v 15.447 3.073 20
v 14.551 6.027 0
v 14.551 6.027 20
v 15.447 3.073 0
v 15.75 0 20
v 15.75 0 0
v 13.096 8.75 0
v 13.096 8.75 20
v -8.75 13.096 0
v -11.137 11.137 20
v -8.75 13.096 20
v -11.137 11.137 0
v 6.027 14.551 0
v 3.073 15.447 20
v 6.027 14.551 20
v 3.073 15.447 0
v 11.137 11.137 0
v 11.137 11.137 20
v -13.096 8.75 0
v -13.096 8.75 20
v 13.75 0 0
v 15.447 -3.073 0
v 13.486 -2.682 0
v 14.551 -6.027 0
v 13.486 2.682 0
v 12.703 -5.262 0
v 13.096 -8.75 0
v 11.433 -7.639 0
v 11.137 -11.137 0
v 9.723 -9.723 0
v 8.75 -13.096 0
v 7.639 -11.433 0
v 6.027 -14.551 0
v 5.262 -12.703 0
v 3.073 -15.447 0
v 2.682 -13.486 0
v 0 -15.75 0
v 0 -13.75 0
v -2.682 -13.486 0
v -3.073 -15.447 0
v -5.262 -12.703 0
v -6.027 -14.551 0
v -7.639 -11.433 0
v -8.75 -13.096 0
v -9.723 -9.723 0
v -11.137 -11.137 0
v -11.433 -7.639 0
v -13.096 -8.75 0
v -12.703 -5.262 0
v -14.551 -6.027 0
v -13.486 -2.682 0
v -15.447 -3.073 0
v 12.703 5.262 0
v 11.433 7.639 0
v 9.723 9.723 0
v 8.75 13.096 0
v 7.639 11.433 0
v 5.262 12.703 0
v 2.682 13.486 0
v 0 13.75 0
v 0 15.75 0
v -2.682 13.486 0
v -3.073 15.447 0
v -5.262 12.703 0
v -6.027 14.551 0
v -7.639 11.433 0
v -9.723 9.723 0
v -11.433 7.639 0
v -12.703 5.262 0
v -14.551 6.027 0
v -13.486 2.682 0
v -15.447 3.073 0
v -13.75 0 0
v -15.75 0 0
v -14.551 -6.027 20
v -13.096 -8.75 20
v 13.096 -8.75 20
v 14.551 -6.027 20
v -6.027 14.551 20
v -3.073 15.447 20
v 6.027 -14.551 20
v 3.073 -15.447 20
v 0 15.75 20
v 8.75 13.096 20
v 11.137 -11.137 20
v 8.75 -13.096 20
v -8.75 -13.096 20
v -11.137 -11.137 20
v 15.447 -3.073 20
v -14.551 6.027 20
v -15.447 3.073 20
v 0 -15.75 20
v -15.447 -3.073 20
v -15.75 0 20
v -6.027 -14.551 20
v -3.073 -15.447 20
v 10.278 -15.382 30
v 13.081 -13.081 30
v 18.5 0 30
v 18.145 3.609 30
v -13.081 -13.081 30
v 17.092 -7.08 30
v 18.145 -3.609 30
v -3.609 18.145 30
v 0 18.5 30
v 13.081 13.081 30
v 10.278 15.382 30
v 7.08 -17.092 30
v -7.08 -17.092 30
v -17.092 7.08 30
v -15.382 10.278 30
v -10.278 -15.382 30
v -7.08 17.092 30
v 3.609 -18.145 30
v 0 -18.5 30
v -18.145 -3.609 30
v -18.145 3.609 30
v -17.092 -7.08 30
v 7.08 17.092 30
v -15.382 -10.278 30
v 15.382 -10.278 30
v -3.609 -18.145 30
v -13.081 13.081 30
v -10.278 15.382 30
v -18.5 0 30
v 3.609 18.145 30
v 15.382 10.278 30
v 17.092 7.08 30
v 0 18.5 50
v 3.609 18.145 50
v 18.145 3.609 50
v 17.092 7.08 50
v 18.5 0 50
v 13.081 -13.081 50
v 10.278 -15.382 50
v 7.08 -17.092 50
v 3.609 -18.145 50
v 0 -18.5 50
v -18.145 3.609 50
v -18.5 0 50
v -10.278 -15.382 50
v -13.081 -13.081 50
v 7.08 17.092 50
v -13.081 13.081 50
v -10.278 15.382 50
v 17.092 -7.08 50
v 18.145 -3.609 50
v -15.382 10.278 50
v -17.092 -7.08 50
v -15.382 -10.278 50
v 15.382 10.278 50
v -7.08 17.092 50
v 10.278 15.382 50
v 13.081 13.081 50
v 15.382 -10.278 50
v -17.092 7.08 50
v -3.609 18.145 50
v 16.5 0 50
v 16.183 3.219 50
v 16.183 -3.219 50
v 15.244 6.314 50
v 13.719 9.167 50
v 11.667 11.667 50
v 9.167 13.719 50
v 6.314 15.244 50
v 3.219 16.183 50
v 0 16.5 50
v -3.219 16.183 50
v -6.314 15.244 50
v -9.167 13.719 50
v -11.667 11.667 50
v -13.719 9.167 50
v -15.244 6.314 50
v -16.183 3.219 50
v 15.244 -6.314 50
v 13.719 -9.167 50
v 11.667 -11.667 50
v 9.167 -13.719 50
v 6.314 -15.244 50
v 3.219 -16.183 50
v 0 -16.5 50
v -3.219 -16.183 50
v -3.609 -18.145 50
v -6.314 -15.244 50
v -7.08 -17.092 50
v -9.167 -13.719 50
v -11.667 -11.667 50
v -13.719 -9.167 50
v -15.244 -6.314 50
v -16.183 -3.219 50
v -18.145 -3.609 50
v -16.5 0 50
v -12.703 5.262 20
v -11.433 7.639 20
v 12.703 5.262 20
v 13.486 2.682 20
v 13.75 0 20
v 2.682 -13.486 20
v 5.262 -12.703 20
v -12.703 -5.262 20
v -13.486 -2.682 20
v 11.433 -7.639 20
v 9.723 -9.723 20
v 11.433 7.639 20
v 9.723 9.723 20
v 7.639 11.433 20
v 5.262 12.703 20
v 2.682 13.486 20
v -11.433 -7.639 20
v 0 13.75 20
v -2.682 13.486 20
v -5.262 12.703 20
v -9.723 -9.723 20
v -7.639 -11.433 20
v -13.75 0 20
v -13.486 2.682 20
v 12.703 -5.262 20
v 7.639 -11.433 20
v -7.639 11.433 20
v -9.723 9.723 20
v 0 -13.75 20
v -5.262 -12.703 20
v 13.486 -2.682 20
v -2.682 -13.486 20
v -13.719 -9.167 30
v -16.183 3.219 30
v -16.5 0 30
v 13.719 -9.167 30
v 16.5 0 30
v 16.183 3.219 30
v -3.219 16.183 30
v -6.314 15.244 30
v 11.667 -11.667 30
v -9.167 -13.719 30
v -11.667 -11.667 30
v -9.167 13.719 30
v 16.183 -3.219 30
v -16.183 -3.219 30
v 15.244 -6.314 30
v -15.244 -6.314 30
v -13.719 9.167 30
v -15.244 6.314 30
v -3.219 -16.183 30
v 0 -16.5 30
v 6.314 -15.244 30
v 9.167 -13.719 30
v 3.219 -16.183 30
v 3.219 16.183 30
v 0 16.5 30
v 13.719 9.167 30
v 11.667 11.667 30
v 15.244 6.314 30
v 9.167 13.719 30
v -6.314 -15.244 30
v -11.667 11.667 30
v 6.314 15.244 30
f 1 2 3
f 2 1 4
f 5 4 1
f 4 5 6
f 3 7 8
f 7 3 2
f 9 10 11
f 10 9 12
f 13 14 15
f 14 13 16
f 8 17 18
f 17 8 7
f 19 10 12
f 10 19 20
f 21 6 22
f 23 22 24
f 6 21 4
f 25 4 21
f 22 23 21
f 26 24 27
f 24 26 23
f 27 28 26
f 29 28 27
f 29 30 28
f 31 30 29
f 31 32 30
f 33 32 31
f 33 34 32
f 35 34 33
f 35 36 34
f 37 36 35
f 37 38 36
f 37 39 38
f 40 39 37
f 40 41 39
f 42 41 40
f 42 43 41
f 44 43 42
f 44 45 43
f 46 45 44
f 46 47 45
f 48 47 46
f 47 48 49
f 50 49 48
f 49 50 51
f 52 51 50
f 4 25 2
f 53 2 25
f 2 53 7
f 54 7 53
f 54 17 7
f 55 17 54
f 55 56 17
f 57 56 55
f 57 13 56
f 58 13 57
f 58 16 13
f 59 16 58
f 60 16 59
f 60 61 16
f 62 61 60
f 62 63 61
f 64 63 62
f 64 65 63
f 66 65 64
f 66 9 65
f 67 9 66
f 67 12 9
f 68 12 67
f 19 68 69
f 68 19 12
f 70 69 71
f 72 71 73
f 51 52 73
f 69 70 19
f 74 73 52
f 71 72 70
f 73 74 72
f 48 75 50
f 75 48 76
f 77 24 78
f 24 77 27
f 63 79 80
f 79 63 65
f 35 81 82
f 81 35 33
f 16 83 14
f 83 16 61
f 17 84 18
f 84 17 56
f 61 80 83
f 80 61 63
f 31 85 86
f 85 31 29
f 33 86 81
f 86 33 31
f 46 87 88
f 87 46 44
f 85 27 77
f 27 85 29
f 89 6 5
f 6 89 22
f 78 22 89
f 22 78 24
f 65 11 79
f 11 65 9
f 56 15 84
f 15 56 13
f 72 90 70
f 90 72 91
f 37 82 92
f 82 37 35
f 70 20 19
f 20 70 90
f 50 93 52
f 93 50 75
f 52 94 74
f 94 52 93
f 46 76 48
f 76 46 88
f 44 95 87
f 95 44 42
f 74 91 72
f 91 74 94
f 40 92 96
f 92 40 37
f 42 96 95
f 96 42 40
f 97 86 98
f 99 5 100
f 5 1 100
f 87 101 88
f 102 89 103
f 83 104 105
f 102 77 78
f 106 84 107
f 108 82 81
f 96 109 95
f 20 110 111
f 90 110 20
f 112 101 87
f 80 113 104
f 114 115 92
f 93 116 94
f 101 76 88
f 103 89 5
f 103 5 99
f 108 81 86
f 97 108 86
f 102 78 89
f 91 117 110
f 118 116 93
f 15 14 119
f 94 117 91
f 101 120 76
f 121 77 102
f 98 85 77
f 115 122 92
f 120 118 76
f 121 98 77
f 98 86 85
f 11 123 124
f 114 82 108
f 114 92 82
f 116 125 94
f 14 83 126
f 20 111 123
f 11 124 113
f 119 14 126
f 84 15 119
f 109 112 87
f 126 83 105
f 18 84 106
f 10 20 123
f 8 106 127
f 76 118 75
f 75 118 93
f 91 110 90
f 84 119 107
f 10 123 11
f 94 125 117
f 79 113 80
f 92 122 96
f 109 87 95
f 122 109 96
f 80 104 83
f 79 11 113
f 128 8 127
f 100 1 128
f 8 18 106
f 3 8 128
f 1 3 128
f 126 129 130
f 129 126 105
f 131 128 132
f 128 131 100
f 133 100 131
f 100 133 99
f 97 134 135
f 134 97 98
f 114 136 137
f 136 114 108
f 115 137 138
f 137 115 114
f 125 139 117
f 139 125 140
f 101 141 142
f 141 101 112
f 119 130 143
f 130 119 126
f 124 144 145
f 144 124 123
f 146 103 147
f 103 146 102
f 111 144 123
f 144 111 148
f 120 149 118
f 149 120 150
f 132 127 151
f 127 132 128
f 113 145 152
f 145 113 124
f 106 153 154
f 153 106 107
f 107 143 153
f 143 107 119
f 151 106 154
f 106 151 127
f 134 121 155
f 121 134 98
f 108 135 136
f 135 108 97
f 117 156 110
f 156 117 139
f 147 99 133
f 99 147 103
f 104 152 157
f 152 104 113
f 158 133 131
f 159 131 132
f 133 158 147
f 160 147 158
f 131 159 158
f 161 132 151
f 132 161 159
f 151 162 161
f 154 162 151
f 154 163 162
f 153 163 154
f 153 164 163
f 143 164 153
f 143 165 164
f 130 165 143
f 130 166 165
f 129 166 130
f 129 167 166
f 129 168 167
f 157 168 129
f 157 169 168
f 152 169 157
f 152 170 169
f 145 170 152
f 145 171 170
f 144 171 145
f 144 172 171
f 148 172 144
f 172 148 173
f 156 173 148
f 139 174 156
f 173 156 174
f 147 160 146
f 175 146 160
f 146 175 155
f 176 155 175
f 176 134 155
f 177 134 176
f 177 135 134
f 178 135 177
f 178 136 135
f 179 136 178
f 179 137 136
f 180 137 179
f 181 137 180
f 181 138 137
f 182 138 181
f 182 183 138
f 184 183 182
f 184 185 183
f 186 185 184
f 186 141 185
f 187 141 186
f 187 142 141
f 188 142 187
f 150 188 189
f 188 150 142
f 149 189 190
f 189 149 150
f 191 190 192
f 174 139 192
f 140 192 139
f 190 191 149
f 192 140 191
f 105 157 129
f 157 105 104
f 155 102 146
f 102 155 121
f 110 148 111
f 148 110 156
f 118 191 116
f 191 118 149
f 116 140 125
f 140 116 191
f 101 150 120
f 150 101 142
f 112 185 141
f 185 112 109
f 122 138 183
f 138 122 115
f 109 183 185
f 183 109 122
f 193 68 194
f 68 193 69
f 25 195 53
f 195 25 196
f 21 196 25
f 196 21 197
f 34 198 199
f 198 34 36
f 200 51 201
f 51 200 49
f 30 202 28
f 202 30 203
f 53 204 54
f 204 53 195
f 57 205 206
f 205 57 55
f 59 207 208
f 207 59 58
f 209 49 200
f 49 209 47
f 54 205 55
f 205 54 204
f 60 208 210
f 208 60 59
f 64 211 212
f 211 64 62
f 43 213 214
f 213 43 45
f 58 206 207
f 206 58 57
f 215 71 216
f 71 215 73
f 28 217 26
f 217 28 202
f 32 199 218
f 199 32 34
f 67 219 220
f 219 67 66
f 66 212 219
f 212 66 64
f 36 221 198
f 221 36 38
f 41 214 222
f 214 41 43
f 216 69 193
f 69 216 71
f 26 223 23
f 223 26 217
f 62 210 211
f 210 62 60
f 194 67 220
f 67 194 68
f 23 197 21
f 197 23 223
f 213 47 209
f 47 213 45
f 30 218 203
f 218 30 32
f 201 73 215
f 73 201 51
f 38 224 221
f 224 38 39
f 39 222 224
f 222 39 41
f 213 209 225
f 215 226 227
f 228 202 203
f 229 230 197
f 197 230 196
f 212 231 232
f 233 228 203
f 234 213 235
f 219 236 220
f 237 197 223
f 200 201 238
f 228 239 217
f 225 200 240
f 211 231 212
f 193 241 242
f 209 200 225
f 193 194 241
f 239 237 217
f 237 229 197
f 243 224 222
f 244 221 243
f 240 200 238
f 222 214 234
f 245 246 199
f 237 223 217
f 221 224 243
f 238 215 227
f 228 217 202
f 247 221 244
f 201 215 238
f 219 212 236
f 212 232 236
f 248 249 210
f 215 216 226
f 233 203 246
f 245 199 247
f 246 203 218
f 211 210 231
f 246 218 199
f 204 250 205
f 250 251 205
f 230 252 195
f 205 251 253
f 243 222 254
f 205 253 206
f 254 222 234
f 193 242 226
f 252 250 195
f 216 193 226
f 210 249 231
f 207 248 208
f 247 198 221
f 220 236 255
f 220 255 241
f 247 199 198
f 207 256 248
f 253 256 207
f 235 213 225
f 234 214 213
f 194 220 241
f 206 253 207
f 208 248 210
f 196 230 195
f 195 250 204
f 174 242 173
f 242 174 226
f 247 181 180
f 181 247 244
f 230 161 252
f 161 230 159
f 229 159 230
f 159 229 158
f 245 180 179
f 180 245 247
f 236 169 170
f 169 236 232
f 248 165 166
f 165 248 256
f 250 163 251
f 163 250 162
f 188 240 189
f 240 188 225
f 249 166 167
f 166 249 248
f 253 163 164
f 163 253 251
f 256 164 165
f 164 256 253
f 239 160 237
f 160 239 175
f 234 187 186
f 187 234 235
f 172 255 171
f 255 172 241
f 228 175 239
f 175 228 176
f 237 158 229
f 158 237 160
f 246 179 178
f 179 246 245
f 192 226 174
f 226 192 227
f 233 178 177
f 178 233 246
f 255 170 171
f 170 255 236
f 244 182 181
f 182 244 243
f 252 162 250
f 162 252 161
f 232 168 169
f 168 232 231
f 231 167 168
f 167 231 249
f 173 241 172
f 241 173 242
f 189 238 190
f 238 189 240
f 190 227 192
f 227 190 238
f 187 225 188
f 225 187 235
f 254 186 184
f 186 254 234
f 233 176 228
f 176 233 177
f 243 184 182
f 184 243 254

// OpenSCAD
/**
 * Ryobi tool adapter for Makita vacuums and dust extractors.
 *
 * This adapter fits inside the dust port of Ryobi 18V ONE+ cordless tools and
 * enables them to be connected to Makita vacuums.
 */

END_SECTION_HEIGHT = 20;
MIDDLE_SECTION_HEIGHT = 10;

module hose_adapter(d1, d2, thickness) {
  module shell(d1, d2) {
    cylinder(h=END_SECTION_HEIGHT, d=d1, $fn=32);
    translate([0, 0, END_SECTION_HEIGHT])
      cylinder(h=MIDDLE_SECTION_HEIGHT, d1=d1, d2=d2, $fn=32);
    translate([0, 0, END_SECTION_HEIGHT + MIDDLE_SECTION_HEIGHT])
      cylinder(h=END_SECTION_HEIGHT, d=d2, $fn=32);
  }
    
  difference() {
    shell(d1, d2);
    shell(d1 - 2 * thickness, d2 - 2 * thickness);
  }
}

hose_adapter(31.5, 37, 2);
